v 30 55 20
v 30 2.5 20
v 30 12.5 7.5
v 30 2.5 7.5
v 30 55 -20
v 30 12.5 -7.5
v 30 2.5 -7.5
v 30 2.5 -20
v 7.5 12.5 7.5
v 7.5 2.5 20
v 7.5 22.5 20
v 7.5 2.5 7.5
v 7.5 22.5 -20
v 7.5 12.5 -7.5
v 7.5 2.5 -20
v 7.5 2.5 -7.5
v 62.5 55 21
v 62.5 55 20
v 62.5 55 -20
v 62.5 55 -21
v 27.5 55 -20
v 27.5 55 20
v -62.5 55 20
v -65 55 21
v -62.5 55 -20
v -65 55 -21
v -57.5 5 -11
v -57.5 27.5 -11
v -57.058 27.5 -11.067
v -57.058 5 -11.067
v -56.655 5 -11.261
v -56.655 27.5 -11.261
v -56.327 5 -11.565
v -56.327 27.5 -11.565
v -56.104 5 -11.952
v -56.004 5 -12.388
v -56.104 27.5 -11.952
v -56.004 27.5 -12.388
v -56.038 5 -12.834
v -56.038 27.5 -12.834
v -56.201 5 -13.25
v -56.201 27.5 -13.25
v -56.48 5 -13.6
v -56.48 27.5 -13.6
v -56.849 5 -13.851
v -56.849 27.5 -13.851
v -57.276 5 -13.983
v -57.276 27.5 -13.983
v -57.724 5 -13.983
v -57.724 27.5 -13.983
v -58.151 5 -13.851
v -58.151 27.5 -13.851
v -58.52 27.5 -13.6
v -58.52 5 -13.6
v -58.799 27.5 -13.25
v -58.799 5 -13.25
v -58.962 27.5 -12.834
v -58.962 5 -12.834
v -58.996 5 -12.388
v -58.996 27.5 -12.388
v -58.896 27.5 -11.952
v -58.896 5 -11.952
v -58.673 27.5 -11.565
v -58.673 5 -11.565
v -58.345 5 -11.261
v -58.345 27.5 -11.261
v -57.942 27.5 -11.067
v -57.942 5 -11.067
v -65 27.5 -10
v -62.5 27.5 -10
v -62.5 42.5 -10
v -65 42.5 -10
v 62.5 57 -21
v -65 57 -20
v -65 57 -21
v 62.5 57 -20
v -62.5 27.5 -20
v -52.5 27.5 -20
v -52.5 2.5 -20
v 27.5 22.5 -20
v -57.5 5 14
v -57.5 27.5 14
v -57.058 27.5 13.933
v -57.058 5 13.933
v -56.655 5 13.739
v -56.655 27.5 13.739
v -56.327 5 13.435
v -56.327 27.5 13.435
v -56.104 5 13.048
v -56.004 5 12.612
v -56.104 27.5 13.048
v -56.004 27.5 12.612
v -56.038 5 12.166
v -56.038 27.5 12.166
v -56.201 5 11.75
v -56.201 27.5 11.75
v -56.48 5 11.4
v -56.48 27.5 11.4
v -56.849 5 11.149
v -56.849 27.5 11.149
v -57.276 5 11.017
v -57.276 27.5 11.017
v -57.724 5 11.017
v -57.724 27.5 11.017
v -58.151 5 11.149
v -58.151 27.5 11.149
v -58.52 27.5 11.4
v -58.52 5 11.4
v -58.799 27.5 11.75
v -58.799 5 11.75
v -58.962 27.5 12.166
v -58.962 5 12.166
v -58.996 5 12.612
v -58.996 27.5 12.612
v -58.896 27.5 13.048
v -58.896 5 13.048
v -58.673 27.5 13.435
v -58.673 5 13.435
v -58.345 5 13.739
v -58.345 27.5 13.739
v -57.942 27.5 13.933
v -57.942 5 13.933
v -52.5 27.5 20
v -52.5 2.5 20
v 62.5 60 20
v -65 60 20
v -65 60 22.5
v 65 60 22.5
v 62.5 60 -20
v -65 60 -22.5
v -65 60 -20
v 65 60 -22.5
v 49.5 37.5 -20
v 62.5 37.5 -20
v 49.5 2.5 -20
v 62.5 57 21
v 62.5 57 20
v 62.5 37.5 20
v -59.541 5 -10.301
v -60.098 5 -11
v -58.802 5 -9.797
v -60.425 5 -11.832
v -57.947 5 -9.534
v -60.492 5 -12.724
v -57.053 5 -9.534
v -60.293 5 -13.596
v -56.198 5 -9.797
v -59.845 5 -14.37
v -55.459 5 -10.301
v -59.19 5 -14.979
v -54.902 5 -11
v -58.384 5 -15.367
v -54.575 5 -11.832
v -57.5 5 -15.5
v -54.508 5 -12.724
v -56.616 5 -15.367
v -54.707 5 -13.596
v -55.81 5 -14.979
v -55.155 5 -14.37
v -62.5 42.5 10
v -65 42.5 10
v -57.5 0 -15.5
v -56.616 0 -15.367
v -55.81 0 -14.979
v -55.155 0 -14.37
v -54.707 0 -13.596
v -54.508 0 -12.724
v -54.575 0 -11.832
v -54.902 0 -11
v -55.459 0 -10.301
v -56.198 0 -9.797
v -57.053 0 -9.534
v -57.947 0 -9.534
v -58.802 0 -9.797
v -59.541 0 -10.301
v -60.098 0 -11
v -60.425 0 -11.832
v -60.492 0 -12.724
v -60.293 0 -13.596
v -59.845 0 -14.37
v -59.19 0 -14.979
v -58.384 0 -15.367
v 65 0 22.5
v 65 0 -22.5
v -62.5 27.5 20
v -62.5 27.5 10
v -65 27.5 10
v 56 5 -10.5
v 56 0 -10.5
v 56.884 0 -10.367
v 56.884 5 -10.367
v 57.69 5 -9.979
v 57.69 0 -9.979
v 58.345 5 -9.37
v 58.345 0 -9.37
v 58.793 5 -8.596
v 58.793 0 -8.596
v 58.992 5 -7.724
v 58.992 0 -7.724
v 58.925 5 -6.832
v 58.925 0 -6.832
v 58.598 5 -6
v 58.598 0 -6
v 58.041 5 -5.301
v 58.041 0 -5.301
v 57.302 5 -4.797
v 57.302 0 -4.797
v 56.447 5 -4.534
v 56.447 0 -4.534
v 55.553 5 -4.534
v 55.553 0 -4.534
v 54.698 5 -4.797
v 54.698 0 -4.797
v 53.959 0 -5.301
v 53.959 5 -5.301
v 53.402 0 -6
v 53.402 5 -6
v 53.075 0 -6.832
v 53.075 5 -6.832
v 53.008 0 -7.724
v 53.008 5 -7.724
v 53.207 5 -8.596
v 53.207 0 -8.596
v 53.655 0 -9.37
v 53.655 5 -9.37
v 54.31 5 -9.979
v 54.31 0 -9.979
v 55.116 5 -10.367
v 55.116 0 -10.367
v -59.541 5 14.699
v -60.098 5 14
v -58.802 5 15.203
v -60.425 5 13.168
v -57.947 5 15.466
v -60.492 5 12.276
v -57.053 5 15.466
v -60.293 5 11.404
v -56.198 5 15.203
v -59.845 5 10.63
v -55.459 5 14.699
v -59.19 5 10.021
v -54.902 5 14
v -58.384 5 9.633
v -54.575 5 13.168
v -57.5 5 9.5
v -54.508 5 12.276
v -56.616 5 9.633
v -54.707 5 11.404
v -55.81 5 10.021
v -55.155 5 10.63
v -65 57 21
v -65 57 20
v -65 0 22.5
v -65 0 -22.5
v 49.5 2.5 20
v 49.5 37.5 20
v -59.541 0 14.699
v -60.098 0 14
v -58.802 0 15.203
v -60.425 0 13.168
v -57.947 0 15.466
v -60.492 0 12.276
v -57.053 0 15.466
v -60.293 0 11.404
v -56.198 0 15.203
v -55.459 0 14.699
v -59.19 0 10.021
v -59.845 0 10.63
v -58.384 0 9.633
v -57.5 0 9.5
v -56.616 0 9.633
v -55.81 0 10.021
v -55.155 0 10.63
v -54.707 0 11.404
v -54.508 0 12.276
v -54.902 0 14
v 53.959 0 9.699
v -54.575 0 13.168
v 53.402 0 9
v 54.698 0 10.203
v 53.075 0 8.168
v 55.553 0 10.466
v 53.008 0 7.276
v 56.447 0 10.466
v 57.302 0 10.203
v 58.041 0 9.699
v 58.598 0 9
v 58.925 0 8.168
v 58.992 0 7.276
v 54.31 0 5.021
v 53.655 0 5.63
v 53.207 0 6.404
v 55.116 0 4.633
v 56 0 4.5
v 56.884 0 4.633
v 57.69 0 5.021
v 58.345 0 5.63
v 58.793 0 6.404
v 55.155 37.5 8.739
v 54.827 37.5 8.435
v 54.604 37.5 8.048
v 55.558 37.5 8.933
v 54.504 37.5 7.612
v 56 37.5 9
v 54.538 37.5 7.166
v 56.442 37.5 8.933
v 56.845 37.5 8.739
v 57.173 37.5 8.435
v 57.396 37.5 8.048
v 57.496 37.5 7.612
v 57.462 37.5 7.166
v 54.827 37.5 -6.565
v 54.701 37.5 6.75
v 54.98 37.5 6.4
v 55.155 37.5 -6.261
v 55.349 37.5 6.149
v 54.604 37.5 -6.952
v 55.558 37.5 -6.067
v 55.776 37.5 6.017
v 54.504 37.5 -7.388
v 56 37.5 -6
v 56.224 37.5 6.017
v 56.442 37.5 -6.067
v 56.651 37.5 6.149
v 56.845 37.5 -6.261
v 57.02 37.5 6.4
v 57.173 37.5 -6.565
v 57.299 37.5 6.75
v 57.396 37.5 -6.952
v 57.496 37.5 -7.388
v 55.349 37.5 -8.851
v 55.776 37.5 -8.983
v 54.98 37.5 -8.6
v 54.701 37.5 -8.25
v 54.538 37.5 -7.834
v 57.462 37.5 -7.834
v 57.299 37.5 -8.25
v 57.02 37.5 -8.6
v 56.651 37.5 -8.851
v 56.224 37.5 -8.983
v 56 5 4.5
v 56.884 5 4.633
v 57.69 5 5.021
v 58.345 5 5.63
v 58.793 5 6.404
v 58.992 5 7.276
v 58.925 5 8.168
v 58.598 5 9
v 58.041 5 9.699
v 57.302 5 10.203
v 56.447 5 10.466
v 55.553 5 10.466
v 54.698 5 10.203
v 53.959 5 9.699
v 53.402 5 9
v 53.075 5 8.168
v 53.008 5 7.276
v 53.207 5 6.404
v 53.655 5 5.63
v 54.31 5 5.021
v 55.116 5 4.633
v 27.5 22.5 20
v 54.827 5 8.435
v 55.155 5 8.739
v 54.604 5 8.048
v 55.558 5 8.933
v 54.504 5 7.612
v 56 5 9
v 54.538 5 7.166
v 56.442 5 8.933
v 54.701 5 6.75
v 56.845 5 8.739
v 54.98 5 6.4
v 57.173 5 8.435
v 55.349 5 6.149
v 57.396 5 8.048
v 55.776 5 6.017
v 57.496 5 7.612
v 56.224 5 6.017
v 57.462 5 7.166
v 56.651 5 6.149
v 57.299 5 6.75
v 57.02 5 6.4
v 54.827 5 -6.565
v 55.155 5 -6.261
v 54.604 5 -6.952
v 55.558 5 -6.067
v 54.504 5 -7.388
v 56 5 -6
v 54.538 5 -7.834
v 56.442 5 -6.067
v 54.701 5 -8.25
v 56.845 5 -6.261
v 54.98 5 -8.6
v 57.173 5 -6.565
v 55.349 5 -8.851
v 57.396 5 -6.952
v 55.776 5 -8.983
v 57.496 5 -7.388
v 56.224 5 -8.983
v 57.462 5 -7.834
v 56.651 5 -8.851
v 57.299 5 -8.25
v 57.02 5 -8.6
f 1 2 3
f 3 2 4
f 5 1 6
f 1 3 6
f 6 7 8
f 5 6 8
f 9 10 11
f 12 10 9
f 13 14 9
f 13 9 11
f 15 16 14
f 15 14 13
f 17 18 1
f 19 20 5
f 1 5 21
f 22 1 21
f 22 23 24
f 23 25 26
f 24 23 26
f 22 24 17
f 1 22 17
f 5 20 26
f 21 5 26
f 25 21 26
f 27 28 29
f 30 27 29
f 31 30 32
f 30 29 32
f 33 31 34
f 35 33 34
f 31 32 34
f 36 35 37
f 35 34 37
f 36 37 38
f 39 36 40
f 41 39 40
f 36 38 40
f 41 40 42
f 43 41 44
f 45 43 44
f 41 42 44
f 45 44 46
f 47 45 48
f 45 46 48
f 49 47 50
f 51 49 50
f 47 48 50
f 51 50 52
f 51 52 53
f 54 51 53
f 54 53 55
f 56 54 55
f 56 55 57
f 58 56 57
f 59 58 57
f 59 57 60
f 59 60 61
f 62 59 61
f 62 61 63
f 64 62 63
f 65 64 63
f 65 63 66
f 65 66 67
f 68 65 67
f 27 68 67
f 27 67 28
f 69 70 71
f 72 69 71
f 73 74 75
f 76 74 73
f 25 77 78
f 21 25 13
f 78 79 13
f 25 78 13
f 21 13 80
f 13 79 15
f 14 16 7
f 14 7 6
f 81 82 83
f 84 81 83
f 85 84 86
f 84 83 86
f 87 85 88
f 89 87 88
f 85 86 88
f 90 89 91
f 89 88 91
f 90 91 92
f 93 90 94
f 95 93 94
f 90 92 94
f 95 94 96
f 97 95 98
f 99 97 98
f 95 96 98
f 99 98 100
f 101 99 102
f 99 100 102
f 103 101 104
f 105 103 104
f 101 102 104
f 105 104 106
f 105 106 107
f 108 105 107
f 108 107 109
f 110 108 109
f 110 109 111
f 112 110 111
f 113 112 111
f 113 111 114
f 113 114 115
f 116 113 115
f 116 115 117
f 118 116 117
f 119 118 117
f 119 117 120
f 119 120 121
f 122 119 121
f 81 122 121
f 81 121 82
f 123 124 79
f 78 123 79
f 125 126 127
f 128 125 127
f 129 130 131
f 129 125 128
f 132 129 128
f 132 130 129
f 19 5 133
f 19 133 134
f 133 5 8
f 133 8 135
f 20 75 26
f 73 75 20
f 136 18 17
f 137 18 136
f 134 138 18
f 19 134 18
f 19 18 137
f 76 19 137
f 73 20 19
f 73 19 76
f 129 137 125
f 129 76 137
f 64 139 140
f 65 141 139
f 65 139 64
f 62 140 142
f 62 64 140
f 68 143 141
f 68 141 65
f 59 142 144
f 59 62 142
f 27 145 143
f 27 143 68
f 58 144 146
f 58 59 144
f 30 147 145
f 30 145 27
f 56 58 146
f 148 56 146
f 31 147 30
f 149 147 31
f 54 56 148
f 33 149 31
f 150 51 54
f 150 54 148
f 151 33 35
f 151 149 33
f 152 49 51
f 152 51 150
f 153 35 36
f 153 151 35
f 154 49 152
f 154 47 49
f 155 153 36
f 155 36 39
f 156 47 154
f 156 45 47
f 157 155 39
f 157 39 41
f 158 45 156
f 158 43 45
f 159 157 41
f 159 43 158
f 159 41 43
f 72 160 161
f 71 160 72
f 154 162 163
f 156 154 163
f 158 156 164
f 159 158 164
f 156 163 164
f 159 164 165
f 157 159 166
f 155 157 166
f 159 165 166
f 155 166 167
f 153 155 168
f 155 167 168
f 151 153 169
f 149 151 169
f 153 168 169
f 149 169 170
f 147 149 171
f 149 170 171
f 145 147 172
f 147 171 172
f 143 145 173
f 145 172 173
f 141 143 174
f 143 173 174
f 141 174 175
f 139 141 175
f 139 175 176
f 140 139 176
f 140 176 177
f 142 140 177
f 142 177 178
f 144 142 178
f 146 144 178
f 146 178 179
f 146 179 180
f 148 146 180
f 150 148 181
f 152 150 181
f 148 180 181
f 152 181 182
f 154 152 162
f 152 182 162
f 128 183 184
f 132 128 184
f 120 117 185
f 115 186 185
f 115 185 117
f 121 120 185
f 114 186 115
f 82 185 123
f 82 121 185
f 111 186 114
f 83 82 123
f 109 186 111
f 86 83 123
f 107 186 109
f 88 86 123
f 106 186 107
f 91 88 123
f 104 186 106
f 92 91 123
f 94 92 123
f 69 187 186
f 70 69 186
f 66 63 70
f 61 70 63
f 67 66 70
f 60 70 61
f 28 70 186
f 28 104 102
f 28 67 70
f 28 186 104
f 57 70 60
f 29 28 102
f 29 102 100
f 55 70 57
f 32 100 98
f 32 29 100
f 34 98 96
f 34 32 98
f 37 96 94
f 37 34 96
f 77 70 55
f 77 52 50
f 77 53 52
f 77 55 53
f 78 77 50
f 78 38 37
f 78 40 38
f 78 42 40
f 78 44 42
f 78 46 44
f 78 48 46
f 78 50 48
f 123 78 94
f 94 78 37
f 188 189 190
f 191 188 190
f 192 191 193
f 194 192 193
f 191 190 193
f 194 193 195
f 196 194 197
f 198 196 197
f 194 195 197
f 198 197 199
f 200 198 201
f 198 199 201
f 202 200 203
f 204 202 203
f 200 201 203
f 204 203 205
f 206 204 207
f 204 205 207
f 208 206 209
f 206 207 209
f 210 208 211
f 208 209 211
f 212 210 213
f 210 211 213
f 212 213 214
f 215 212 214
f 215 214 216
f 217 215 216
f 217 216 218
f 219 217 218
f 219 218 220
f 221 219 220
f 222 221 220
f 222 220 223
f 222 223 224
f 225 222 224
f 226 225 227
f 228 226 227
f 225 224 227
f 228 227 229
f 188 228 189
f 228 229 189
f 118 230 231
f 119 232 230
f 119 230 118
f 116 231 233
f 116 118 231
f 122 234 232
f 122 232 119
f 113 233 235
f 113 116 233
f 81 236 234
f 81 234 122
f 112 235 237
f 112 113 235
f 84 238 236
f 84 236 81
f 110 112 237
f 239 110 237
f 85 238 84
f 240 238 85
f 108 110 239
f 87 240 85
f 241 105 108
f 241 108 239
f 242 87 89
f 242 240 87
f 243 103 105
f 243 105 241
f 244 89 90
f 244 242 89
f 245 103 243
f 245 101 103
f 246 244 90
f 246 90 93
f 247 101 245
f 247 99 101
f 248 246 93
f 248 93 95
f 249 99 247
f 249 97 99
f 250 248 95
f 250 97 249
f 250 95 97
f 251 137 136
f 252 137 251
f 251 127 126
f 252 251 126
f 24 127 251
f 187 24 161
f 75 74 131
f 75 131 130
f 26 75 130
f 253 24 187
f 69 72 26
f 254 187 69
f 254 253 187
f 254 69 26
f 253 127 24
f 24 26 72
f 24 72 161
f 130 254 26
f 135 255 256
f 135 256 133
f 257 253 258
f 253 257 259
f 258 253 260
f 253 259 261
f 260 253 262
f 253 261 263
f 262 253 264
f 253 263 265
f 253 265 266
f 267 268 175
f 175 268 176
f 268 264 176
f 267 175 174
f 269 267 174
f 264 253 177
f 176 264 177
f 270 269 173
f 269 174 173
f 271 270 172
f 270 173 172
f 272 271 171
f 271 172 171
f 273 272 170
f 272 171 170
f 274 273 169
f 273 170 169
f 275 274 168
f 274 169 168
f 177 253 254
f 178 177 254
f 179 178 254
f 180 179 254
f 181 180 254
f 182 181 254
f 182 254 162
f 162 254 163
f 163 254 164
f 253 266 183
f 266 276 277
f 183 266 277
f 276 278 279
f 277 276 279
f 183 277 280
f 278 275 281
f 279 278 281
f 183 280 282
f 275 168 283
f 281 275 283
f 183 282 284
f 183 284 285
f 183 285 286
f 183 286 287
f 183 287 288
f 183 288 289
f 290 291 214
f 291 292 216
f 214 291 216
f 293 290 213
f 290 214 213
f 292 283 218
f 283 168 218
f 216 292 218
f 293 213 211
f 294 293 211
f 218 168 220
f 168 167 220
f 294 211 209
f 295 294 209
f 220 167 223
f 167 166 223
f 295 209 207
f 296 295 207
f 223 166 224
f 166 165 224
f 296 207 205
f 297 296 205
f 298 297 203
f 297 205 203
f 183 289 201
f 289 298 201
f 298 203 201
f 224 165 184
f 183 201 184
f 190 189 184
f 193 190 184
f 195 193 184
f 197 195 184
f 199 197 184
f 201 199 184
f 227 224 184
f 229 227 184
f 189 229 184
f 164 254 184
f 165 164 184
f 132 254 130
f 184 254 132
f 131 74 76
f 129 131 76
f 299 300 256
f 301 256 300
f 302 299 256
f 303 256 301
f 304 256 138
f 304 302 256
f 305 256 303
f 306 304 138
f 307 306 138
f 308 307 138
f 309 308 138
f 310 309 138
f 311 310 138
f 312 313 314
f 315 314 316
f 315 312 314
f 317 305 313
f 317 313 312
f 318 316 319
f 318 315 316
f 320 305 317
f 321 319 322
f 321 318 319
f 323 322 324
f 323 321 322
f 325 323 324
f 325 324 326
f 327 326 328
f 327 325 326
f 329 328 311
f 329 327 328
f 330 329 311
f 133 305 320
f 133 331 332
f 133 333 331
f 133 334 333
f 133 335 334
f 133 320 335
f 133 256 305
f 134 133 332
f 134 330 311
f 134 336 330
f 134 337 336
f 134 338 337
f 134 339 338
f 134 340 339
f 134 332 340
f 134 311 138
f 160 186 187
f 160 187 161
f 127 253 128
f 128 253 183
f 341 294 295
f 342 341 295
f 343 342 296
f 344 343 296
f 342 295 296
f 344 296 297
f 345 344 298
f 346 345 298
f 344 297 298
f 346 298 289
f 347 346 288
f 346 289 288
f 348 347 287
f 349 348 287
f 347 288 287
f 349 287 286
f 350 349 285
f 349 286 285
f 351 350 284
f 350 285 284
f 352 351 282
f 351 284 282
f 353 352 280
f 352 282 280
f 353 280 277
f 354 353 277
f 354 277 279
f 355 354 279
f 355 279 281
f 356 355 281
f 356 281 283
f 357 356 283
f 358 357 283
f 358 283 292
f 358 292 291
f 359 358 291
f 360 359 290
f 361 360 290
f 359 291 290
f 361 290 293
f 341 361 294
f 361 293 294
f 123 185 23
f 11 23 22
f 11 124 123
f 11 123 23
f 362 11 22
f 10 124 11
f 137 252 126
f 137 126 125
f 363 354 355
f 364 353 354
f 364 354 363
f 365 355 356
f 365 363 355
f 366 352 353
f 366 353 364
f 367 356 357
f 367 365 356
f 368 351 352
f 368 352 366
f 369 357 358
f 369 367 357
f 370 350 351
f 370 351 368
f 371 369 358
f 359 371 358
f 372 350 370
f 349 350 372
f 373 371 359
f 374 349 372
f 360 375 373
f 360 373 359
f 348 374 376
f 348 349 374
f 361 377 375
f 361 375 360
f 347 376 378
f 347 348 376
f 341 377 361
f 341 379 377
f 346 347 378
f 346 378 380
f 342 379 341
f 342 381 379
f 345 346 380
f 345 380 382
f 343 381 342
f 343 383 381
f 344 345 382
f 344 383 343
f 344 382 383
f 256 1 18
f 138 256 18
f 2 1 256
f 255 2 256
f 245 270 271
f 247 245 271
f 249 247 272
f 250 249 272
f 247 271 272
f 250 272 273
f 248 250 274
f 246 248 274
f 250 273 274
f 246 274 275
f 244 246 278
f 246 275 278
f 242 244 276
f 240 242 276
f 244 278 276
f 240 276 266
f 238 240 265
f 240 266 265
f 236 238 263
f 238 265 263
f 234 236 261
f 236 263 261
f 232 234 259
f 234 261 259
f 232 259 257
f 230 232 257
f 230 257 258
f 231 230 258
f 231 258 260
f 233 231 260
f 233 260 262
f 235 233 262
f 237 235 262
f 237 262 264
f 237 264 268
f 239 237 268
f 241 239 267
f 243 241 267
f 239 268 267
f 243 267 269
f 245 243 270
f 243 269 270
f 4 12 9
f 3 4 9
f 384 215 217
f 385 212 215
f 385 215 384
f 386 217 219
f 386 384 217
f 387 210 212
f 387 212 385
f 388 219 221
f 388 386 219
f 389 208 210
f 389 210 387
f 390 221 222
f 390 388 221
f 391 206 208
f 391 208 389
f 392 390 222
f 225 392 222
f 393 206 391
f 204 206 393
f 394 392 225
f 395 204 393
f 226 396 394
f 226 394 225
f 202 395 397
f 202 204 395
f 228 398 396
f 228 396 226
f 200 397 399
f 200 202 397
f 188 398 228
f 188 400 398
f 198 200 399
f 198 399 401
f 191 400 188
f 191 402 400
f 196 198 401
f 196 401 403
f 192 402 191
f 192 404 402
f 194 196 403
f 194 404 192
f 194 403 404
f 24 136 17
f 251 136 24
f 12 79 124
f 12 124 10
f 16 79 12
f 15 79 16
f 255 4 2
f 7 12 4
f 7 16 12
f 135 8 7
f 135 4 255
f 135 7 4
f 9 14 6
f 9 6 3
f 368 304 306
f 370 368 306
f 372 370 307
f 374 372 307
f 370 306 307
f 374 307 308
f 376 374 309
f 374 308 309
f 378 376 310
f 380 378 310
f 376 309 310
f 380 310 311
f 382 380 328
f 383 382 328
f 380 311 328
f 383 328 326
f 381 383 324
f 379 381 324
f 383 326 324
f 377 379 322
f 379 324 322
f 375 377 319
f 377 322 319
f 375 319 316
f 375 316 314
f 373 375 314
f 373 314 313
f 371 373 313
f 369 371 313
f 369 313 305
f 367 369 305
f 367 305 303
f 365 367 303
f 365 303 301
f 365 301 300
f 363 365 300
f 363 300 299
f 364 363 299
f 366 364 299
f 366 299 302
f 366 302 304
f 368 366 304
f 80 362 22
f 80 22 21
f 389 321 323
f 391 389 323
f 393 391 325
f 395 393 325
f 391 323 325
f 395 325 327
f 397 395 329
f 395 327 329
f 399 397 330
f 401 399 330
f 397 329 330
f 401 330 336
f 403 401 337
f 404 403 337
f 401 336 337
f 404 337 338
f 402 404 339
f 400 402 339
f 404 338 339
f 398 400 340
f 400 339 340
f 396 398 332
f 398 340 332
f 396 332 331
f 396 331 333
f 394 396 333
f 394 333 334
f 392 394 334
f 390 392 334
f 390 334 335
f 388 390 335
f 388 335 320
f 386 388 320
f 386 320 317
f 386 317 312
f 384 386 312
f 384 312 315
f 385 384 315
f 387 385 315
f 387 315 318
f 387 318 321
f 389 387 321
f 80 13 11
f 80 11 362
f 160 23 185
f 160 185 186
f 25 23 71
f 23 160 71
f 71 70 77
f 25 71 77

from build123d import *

# Parameters (mm, degrees)
SKETCH1_W           = 130
SKETCH1_H           = 45
BOSS_EXTRUDE1_DEPTH = 60
SHELL3_T            = -2.5
SKETCH4_W           = 2.5
SKETCH4_H           = 40
BOSS_EXTRUDE2_DEPTH = 57.5
SKETCH5_W           = 13
SKETCH5_H           = 40
BOSS_EXTRUDE3_DEPTH = 35
SKETCH6_W           = 20
SKETCH6_H           = 40
BOSS_EXTRUDE4_DEPTH = 20
SKETCH7_W           = 10
SKETCH7_H           = 40
BOSS_EXTRUDE5_DEPTH = 25
SKETCH9_R           = 1.5
CUT_EXTRUDE1_DEPTH  = 27.5
SKETCH11_R          = 1.5
CUT_EXTRUDE2_DEPTH  = 37.5
SKETCH16_W          = 20
SKETCH16_H          = 15
CUT_EXTRUDE3_DEPTH  = 2.5
SKETCH18_W          = 15
SKETCH18_H          = 10
CUT_EXTRUDE4_DEPTH  = 22.5
SKETCH19_W          = 40
SKETCH19_H          = 5
CUT_EXTRUDE5_DEPTH  = 2.5
SKETCH20_W          = 40
SKETCH20_H          = 5
CUT_EXTRUDE6_DEPTH  = 2.5
SKETCH21_R          = 3
CUT_EXTRUDE7_DEPTH  = 5
SKETCH22_W          = 127.5
SKETCH22_H          = 2
CUT_EXTRUDE8_DEPTH  = 1
SKETCH23_W          = 127.5
SKETCH23_H          = 2
CUT_EXTRUDE9_DEPTH  = 1


with BuildPart() as part:
    # Sketch1 → Boss-Extrude1 (new body)
    with BuildSketch(Plane(origin=(0, 0, 0), x_dir=(1, 0, 0), z_dir=(0, 1, 0))):
        Rectangle(SKETCH1_W, SKETCH1_H)
    extrude(amount=BOSS_EXTRUDE1_DEPTH)

    # Shell3
    shell3_openings = [part.faces().sort_by_distance(p)[0] for p in [
        (0, 60, 0),
    ]]
    offset(amount=SHELL3_T, openings=shell3_openings, kind=Kind.INTERSECTION)

    # Sketch4 → Boss-Extrude2 (add)
    with BuildSketch(Plane(origin=(0, 2.5, 0), x_dir=(1, 0, 0), z_dir=(0, 1, 0))):
        with Locations((28.75, 0)):
            Rectangle(SKETCH4_W, SKETCH4_H)
    extrude(amount=BOSS_EXTRUDE2_DEPTH)

    # Sketch5 → Boss-Extrude3 (add)
    with BuildSketch(Plane(origin=(0, 2.5, 0), x_dir=(1, 0, 0), z_dir=(0, 1, 0))):
        with Locations((56, 0)):
            Rectangle(SKETCH5_W, SKETCH5_H)
    extrude(amount=BOSS_EXTRUDE3_DEPTH)

    # Sketch6 → Boss-Extrude4 (add)
    with BuildSketch(Plane(origin=(0, 2.5, 0), x_dir=(1, 0, 0), z_dir=(0, 1, 0))):
        with Locations((17.5, 0)):
            Rectangle(SKETCH6_W, SKETCH6_H)
    extrude(amount=BOSS_EXTRUDE4_DEPTH)

    # Sketch7 → Boss-Extrude5 (add)
    with BuildSketch(Plane(origin=(0, 2.5, 0), x_dir=(1, 0, 0), z_dir=(0, 1, 0))):
        with Locations((-57.5, 0)):
            Rectangle(SKETCH7_W, SKETCH7_H)
    extrude(amount=BOSS_EXTRUDE5_DEPTH)

    # Sketch9 → Cut-Extrude1 (cut)
    with BuildSketch(Plane(origin=(0, 27.5, 0), x_dir=(1, 0, 0), z_dir=(0, 1, 0))):
        with Locations(Location((-57.5, 12.5, 0), (0, 0, 270))):
            Circle(SKETCH9_R)
        with Locations(Location((-57.5, -12.5, 0), (0, 0, 270))):
            Circle(SKETCH9_R)
    extrude(amount=-CUT_EXTRUDE1_DEPTH, mode=Mode.SUBTRACT)

    # Sketch11 → Cut-Extrude2 (cut)
    with BuildSketch(Plane(origin=(0, 37.5, 0), x_dir=(1, 0, 0), z_dir=(0, 1, 0))):
        with Locations(Location((56, 7.5, 0), (0, 0, 270))):
            Circle(SKETCH11_R)
        with Locations(Location((56, -7.5, 0), (0, 0, 270))):
            Circle(SKETCH11_R)
    extrude(amount=-CUT_EXTRUDE2_DEPTH, mode=Mode.SUBTRACT)

    # Sketch16 → Cut-Extrude3 (cut)
    with BuildSketch(Plane(origin=(-62.5, 0, 0), x_dir=(0, 0, -1), z_dir=(1, 0, 0))):
        with Locations((0, 35)):
            Rectangle(SKETCH16_W, SKETCH16_H)
    extrude(amount=-CUT_EXTRUDE3_DEPTH, mode=Mode.SUBTRACT)

    # Sketch18 → Cut-Extrude4 (cut)
    with BuildSketch(Plane.ZY.offset(-7.5)):
        with Locations((0, 7.5)):
            Rectangle(SKETCH18_W, SKETCH18_H)
    extrude(amount=-CUT_EXTRUDE4_DEPTH, mode=Mode.SUBTRACT)

    # Sketch19 → Cut-Extrude5 (cut)
    with BuildSketch(Plane(origin=(-62.5, 0, 0), x_dir=(0, 0, -1), z_dir=(1, 0, 0))):
        with Locations((0, 57.5)):
            Rectangle(SKETCH19_W, SKETCH19_H)
    extrude(amount=-CUT_EXTRUDE5_DEPTH, mode=Mode.SUBTRACT)

    # Sketch20 → Cut-Extrude6 (cut)
    with BuildSketch(Plane.ZY.offset(-27.5)):
        with Locations((0, 57.5)):
            Rectangle(SKETCH20_W, SKETCH20_H)
    extrude(amount=-CUT_EXTRUDE6_DEPTH, mode=Mode.SUBTRACT)

    # Sketch21 → Cut-Extrude7 (cut)
    with BuildSketch(Plane.XZ):
        with Locations(Location((56, -7.5, 0), (0, 0, 270))):
            Circle(SKETCH21_R)
        with Locations(Location((56, 7.5, 0), (0, 0, 270))):
            Circle(SKETCH21_R)
        with Locations(Location((-57.5, -12.5, 0), (0, 0, 270))):
            Circle(SKETCH21_R)
        with Locations(Location((-57.5, 12.5, 0), (0, 0, 270))):
            Circle(SKETCH21_R)
    extrude(amount=-CUT_EXTRUDE7_DEPTH, mode=Mode.SUBTRACT)

    # Sketch22 → Cut-Extrude8 (cut)
    with BuildSketch(Plane.XY.offset(-20)):
        with Locations((-1.25, 56)):
            Rectangle(SKETCH22_W, SKETCH22_H)
    extrude(amount=-CUT_EXTRUDE8_DEPTH, mode=Mode.SUBTRACT)

    # Sketch23 → Cut-Extrude9 (cut)
    with BuildSketch(Plane(origin=(0, 0, 20), x_dir=(-1, 0, 0), z_dir=(0, 0, -1))):
        with Locations((1.25, 56)):
            Rectangle(SKETCH23_W, SKETCH23_H)
    extrude(amount=-CUT_EXTRUDE9_DEPTH, mode=Mode.SUBTRACT)


solid = part.part
